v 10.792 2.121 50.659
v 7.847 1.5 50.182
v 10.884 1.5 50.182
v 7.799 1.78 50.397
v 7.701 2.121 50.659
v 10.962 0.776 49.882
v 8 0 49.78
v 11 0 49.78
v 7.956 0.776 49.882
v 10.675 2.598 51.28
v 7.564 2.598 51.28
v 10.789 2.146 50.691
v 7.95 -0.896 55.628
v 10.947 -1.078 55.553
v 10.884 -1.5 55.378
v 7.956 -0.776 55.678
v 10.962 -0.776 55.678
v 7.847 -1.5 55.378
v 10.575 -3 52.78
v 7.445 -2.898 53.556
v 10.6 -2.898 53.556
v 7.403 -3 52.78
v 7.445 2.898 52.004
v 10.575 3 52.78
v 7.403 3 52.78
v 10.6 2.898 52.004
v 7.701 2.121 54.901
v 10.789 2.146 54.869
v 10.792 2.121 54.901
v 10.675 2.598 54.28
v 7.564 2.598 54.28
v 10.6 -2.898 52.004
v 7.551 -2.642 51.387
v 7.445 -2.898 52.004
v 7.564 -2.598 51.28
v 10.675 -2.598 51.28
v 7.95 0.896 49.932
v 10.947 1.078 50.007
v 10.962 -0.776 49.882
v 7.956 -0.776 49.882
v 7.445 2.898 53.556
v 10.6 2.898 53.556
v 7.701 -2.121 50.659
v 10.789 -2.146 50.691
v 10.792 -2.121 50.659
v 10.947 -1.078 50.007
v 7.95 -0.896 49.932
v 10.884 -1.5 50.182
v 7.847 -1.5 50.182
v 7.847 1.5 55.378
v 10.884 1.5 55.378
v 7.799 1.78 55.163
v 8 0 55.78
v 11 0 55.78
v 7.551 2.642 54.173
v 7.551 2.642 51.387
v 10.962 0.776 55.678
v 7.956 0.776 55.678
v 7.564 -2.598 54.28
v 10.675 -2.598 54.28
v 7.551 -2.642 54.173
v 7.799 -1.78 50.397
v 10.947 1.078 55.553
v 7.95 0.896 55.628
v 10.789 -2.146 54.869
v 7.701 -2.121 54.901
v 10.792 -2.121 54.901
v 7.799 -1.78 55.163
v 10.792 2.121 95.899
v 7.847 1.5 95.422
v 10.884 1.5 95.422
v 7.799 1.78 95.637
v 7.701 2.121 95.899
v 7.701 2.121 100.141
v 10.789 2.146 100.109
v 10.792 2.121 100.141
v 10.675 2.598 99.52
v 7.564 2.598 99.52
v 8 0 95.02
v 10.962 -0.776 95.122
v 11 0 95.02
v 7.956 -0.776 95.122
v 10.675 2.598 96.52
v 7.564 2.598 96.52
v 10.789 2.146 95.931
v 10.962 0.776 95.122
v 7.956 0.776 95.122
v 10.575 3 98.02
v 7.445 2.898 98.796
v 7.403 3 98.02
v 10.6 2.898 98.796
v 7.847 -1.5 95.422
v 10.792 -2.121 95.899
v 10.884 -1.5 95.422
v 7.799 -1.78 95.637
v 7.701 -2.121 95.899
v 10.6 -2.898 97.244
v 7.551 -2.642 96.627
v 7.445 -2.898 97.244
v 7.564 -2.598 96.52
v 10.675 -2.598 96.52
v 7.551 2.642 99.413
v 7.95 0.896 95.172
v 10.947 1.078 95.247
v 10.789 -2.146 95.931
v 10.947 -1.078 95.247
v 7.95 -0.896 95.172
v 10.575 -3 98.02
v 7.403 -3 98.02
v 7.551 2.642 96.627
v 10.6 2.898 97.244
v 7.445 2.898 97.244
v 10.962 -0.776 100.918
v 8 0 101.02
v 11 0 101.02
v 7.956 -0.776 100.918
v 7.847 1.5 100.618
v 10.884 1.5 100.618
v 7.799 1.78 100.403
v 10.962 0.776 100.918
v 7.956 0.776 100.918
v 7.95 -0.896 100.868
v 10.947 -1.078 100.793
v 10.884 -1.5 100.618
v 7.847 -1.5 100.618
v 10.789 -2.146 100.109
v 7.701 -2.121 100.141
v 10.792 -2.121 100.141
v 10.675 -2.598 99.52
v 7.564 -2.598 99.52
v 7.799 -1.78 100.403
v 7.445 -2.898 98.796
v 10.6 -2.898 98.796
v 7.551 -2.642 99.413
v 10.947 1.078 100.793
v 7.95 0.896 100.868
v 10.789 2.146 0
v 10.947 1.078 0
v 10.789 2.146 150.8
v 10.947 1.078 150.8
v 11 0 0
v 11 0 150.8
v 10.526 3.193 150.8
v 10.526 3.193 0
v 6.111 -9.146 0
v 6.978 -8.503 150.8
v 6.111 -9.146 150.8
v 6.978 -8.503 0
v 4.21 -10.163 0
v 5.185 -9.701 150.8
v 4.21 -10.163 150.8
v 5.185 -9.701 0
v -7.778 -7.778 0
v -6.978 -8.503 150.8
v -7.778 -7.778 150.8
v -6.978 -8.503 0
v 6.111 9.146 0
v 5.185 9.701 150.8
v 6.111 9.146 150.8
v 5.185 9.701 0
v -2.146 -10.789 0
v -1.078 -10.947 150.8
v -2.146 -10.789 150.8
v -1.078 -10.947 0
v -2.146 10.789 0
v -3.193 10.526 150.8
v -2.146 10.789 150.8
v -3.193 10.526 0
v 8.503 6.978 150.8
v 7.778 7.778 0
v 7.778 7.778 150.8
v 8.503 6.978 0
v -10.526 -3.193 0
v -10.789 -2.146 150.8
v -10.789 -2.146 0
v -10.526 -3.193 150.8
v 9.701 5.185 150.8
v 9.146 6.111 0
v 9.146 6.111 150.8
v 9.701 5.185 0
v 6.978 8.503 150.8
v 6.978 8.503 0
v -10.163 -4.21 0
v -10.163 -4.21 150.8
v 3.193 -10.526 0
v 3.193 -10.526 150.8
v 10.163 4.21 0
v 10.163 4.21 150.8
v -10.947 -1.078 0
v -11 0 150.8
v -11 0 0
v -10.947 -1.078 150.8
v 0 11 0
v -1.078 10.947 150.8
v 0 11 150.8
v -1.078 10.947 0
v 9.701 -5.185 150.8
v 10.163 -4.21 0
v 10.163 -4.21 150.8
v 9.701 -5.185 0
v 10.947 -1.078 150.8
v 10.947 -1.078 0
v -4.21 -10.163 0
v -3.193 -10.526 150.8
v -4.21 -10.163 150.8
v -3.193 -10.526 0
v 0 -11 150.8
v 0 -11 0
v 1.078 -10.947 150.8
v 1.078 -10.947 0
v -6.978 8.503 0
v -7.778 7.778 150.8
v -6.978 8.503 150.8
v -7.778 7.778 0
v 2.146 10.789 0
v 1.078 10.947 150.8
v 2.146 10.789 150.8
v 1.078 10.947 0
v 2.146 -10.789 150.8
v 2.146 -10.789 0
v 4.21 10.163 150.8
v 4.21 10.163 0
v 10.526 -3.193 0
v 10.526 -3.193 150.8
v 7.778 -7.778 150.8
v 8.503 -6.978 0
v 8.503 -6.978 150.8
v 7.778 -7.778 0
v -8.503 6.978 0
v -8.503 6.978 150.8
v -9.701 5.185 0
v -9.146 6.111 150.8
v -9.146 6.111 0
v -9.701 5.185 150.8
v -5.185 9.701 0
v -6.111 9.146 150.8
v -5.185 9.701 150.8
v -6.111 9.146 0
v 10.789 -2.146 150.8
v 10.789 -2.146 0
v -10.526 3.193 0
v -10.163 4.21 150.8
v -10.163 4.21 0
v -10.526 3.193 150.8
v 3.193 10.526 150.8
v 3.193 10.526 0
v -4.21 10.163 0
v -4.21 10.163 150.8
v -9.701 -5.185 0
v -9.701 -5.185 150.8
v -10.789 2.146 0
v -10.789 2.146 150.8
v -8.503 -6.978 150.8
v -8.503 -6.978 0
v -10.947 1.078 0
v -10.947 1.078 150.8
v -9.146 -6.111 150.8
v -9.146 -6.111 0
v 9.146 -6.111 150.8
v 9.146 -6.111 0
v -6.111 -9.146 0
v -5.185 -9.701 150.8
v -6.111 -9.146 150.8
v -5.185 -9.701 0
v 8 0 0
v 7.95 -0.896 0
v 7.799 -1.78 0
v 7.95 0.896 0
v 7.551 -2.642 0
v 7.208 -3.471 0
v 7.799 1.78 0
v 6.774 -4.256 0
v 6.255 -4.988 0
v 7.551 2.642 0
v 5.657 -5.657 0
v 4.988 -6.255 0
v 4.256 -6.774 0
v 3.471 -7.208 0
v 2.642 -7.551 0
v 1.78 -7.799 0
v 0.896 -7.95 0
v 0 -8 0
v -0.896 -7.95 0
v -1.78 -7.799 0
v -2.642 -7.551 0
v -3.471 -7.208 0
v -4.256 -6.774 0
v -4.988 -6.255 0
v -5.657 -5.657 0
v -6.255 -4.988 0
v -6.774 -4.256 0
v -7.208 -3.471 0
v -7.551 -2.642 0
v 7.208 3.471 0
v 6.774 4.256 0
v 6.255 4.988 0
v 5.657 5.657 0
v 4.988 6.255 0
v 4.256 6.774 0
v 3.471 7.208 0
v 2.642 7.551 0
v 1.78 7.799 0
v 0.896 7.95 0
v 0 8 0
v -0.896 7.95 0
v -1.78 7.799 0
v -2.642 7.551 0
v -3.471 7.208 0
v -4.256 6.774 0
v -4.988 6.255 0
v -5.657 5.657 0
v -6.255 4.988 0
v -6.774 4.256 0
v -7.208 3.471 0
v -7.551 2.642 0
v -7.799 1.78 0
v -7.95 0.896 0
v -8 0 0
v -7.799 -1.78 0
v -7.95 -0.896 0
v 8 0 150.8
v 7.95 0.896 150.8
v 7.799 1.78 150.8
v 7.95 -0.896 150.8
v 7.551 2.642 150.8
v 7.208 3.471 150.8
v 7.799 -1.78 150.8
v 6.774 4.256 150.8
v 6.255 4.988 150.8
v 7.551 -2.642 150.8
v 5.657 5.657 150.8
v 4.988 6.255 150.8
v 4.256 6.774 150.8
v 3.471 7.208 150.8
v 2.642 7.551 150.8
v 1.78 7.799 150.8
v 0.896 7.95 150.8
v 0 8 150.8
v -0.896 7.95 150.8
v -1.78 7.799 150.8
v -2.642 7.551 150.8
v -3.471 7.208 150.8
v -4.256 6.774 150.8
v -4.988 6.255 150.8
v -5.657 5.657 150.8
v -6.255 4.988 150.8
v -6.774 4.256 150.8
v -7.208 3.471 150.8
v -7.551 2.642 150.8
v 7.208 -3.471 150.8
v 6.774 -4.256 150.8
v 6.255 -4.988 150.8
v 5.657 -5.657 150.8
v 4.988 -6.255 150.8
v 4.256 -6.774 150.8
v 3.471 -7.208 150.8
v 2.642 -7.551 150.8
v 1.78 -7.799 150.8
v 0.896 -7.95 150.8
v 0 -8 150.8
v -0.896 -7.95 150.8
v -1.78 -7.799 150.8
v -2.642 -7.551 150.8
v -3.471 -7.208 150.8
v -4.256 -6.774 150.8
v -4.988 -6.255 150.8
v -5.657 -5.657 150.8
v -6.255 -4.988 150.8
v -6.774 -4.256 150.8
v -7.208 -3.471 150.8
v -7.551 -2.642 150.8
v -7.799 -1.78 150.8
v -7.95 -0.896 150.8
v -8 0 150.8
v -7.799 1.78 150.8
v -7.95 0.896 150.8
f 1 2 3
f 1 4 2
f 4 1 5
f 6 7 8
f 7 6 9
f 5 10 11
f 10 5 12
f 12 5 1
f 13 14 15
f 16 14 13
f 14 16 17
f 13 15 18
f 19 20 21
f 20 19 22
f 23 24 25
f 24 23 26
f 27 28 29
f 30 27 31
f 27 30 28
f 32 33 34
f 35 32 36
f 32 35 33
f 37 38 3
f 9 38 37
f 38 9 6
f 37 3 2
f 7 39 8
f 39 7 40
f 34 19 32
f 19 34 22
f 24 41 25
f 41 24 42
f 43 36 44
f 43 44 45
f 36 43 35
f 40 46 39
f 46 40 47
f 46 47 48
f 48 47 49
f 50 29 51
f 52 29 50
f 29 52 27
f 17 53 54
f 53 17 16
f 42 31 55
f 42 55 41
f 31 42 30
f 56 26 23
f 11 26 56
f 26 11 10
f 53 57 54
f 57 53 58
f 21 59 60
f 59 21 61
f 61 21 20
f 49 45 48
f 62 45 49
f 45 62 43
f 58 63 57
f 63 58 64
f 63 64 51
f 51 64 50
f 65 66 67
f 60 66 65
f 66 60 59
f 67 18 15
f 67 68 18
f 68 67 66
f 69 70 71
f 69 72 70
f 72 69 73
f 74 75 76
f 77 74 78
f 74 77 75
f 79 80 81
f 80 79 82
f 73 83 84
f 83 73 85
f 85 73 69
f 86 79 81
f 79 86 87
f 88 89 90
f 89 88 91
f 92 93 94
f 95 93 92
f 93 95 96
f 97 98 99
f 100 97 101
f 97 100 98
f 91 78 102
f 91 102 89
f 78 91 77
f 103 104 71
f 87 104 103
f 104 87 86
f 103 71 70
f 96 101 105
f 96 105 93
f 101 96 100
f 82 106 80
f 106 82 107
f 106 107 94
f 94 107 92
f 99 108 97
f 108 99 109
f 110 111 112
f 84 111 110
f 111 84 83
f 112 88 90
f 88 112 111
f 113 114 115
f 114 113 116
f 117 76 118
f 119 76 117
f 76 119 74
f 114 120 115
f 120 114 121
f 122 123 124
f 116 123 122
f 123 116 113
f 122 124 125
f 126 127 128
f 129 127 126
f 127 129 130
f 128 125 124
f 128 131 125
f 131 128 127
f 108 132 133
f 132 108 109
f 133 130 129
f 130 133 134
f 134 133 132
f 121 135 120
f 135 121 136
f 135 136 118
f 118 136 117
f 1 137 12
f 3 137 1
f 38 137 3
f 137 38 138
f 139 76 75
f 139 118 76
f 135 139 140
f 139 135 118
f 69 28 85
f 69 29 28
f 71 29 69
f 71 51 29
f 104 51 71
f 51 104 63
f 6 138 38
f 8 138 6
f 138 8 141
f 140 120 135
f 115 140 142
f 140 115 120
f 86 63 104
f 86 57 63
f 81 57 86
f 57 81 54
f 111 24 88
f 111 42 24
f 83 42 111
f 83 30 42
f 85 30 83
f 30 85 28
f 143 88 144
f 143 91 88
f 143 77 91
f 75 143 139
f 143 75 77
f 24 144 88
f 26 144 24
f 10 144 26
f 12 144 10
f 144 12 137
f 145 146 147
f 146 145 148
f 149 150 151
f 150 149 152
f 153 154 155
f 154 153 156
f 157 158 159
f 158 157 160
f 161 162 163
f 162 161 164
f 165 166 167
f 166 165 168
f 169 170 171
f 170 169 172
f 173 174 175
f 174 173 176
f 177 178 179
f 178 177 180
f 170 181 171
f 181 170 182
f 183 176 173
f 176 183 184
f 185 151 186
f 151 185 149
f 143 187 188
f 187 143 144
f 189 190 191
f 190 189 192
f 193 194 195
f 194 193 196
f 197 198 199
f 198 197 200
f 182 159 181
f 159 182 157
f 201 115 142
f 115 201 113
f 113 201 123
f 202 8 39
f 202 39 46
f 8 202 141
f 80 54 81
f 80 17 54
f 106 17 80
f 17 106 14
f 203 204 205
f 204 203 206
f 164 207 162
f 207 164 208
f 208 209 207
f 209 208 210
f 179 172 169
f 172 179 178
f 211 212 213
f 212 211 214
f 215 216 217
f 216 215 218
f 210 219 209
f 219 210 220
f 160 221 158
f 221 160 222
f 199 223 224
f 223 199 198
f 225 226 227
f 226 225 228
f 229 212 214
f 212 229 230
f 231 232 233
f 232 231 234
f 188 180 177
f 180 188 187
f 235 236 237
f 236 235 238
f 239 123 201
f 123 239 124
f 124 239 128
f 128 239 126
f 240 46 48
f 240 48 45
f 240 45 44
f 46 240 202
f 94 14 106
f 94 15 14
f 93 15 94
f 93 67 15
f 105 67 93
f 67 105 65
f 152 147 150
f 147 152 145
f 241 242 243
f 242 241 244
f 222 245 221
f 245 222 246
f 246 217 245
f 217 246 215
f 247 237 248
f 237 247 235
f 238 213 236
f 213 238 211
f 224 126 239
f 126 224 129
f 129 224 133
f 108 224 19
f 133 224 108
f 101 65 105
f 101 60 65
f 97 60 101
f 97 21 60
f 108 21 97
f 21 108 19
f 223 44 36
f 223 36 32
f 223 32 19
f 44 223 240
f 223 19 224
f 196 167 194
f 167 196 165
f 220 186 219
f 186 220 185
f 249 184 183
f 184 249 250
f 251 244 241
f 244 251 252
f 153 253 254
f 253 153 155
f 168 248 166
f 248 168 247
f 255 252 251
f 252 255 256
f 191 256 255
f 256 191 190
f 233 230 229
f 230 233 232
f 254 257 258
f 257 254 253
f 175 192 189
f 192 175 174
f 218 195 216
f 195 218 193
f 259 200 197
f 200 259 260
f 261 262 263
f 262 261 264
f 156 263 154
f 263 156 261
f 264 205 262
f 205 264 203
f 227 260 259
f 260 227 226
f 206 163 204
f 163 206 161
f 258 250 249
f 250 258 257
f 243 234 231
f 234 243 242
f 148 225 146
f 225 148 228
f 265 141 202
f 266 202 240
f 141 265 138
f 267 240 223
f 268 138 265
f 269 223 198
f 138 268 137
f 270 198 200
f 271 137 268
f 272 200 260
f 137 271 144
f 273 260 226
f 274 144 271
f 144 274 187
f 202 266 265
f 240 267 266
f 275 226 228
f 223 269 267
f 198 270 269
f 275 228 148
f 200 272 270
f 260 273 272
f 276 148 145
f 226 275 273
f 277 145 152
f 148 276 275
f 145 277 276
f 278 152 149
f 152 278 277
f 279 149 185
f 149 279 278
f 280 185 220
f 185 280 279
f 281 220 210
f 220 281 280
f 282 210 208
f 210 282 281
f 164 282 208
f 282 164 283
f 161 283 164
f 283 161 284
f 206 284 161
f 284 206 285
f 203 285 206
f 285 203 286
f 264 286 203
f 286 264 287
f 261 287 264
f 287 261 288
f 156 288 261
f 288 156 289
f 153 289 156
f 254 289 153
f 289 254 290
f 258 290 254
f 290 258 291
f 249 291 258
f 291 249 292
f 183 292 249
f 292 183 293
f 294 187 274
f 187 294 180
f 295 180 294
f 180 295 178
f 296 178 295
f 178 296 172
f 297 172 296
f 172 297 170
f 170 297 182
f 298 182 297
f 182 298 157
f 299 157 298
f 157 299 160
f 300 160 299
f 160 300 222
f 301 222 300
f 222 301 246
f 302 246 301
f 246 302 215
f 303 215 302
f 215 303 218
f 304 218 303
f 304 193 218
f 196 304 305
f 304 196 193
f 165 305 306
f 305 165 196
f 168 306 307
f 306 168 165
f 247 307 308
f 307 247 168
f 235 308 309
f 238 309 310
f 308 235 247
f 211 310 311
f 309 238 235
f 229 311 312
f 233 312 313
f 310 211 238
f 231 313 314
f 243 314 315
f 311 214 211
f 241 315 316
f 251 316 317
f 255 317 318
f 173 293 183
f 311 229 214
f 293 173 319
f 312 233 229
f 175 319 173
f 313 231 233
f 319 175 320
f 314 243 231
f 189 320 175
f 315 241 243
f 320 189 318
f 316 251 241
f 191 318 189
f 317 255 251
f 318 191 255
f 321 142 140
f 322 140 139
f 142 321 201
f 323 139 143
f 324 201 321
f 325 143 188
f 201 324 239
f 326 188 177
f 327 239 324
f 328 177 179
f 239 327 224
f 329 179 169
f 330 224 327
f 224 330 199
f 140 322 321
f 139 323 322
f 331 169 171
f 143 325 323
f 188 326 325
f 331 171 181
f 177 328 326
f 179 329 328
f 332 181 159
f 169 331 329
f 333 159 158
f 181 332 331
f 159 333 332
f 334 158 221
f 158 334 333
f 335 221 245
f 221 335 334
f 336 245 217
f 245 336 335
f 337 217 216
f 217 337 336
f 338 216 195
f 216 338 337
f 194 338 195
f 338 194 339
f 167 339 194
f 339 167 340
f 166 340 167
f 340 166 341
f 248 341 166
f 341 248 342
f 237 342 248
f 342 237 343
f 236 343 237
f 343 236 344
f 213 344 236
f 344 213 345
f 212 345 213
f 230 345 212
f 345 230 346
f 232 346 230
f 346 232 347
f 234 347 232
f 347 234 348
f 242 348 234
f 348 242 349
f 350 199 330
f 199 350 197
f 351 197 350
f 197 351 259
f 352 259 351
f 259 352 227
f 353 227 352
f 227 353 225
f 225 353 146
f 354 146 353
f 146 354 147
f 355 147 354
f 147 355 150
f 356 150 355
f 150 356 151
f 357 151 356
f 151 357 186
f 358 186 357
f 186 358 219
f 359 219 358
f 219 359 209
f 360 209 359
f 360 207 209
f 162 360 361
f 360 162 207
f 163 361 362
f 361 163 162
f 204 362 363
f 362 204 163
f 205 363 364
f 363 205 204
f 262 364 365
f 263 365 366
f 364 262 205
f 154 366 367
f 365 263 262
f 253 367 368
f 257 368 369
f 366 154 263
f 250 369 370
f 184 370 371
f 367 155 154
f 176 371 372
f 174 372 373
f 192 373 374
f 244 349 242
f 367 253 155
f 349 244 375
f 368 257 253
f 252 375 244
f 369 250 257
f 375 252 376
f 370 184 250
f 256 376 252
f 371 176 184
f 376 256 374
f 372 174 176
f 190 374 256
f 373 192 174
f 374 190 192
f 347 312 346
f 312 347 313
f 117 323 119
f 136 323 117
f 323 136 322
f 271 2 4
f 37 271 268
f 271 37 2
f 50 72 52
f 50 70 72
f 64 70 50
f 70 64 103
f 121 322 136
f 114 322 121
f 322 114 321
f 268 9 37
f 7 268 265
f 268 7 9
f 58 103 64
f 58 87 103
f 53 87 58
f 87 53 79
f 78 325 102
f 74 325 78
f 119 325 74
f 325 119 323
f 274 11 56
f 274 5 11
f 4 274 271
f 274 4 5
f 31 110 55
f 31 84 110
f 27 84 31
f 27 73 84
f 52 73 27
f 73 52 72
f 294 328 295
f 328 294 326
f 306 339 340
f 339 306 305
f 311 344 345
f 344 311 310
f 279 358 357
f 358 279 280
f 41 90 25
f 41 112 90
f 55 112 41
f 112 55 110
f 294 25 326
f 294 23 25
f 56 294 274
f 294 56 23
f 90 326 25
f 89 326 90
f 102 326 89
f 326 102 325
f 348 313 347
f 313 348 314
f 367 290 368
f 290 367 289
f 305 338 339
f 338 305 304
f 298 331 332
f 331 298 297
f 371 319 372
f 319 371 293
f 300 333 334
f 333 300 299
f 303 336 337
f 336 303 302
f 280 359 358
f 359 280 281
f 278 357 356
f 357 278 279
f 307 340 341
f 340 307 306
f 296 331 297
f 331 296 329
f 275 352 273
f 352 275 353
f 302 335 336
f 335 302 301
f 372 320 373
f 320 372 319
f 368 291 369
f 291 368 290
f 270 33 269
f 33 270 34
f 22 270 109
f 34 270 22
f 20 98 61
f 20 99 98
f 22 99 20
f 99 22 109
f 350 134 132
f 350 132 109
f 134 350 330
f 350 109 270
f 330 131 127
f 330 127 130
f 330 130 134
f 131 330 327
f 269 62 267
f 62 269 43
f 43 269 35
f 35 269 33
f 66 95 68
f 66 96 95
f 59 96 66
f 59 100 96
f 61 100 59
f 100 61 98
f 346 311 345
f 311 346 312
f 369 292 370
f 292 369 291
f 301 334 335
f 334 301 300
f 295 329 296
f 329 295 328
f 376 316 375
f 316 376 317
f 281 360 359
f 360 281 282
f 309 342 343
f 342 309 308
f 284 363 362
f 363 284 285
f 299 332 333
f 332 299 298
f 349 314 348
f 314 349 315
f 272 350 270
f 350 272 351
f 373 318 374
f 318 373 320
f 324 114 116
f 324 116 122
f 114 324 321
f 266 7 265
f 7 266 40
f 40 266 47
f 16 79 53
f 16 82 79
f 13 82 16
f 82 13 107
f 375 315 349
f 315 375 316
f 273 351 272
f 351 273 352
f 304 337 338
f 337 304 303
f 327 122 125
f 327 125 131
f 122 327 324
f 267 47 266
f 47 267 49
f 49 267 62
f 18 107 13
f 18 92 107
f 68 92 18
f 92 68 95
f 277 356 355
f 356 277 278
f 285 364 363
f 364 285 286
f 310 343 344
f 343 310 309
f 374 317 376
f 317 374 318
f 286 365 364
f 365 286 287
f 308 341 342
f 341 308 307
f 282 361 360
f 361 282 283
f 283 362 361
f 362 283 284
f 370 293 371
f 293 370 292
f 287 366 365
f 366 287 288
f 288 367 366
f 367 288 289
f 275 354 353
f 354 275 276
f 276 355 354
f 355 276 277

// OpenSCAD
// file: params.scad
// Glorb — shared parameters (include from other files)
// Units: millimeters
// Design OD ~12 in → R = 152.4 mm to outer diffuser face

RADIUS_MM = 152.4;

// Strut chords at RADIUS_MM (from mesh/edge_lengths.csv)
STRUT_SHORT = 83.292;
STRUT_LONG  = 94.188;

// Frame (no hub nodes) — faceplate rabbet
FACEPLATE_T = 1.0;       // flush pocket depth
RIM = 2.0;               // outer rim outside faceplate
LEDGE = 1.5;             // support under faceplate
STRUT_DEPTH = 8.0;       // frame thickness inward

// Hub / strut interface (legacy OpenSCAD struts — superseded by Frame_Channels)
STRUT_OD = 6.0;
STRUT_ID = 3.2;
HUB_SOCKET_DEPTH = 6.0;
HUB_BALL = 14.0;

// Light cup (optional alternate architecture)
CUP_WALL = 1.8;
CUP_DEPTH = 10.0;
CUP_FLOOR = 1.6;
LED_BORE = 5.2;
LED_WIRE_SLOT = 2.5;

// Diffuser / faceplate
DIFFUSER_T = FACEPLATE_T;
DIFFUSER_LIP = 0.4;

// Column / base / sphere sleeve
COLUMN_OD_IN = 22.0;     // section inside sphere (above ridge)
COLUMN_OD_BASE = 28.0;   // wider below ridge (mount stop)
COLUMN_ID = 16.0;
COLUMN_INTO_SPHERE = 50.8;  // 2.00 in
COLUMN_BELOW_RIDGE = 100.0;
SLEEVE_ID = 22.4;        // slip on COLUMN_OD_IN
SLEEVE_OD = 32.0;
SLEEVE_LEN = 40.0;
SLEEVE_FLANGE_OD = 36.0;
SLEEVE_FLANGE_T = 3.0;
BASE_D = 170.0;              // top outer OD (skirt); pack+DevKit+buck+stays+lip
BASE_FLOOR_T = 2.0;          // min floor thickness
BASE_SHELL_T = 5.0;          // lid thickness (column socket sits on this)
BASE_CLEAR_H = 44.45;        // 1.75 in interior clearance (battery-safe)
BASE_WALL_T = 5.0;           // BaseTop skirt wall
BASE_LIP_T = 2.5;            // BaseTub short register wall
BASE_LIP_H = 10.0;           // lip height top skirt slides over
BASE_SLIP = 0.4;             // diametral clearance top-ID vs lip-OD
BASE_H = BASE_FLOOR_T + BASE_CLEAR_H + BASE_SHELL_T;  // 51.45 mm overall
BASE_ID = BASE_D - 2 * BASE_WALL_T;  // top skirt ID (~160 mm)
BASE_LIP_OD = BASE_ID - BASE_SLIP;
BASE_BAY_ID = BASE_LIP_OD - 2 * BASE_LIP_T;  // clear inside tub lip

// Bay envelopes (mm) — leave air around; confirm on arrival
BATT_XYZ = [72, 57, 39];           // NYI 12V 6000mAh (2.83x2.26x1.52 in)
BATT_URL = "https://www.amazon.com/dp/B0FDVGB87N";
BATT_OUT_A = 3.0;                  // max continuous output (A)
// Charge with included 12.6V/2A supply only (not a plain 12V adapter)
BUCK_XYZ = [17.5, 12.3, 4.3];      // MP1584EN fixed 5V mini (Amazon B0B779ZYN1)
BUCK_URL = "https://www.amazon.com/dp/B0B779ZYN1";
// Common ESP32-WROOM DevKit (30-pin DOIT/clone ~51.5x28; DevKitC ~55x28 w/ antenna)
// Keep-out includes USB overhang + header height
ESP32_XYZ = [55, 30, 15];
ESP32_NOTE = "ESP32-WROOM DevKit class (home stock)";
JACK_HOLE_D = 12.0;                // panel barrel jack (charger / 12V in)
JACK_CENTER_Z = BASE_FLOOR_T + 20; // above lip — skirt opens into bay
// Base orientation: −Y = front (power switch), +Y = back (DC jack)

// DaierTek KCD1-5-101 round rocker (Amazon B07S1MV462) — snap-in Ø20 mm
SW_HOLE_D = 20.2;                  // print clearance on 20 mm mounting hole
SW_CBORE_D = 24.0;                 // underside counterbore (snap land)
SW_PANEL_T = 2.0;                  // remaining lid thickness at switch
SW_POS = [0, -50];                 // mm on BaseTop lid — front (−Y)
SW_URL = "https://www.amazon.com/dp/B07S1MV462";

// legacy alias
COLUMN_OD = COLUMN_OD_IN;
COLUMN_LEN = COLUMN_INTO_SPHERE + COLUMN_BELOW_RIDGE;
// main file
// Glorb — central wiring column

include <params.scad>

module column() {
    difference() {
        cylinder(d=COLUMN_OD, h=COLUMN_LEN, $fn=64);
        translate([0, 0, -1])
            cylinder(d=COLUMN_ID, h=COLUMN_LEN + 2, $fn=56);
        // side exits for power injection (two latitudes)
        for (z = [COLUMN_LEN * 0.35, COLUMN_LEN * 0.65])
            translate([0, 0, z])
                rotate([0, 90, 0])
                    cylinder(d=6, h=COLUMN_OD, $fn=24);
    }
}

column();
